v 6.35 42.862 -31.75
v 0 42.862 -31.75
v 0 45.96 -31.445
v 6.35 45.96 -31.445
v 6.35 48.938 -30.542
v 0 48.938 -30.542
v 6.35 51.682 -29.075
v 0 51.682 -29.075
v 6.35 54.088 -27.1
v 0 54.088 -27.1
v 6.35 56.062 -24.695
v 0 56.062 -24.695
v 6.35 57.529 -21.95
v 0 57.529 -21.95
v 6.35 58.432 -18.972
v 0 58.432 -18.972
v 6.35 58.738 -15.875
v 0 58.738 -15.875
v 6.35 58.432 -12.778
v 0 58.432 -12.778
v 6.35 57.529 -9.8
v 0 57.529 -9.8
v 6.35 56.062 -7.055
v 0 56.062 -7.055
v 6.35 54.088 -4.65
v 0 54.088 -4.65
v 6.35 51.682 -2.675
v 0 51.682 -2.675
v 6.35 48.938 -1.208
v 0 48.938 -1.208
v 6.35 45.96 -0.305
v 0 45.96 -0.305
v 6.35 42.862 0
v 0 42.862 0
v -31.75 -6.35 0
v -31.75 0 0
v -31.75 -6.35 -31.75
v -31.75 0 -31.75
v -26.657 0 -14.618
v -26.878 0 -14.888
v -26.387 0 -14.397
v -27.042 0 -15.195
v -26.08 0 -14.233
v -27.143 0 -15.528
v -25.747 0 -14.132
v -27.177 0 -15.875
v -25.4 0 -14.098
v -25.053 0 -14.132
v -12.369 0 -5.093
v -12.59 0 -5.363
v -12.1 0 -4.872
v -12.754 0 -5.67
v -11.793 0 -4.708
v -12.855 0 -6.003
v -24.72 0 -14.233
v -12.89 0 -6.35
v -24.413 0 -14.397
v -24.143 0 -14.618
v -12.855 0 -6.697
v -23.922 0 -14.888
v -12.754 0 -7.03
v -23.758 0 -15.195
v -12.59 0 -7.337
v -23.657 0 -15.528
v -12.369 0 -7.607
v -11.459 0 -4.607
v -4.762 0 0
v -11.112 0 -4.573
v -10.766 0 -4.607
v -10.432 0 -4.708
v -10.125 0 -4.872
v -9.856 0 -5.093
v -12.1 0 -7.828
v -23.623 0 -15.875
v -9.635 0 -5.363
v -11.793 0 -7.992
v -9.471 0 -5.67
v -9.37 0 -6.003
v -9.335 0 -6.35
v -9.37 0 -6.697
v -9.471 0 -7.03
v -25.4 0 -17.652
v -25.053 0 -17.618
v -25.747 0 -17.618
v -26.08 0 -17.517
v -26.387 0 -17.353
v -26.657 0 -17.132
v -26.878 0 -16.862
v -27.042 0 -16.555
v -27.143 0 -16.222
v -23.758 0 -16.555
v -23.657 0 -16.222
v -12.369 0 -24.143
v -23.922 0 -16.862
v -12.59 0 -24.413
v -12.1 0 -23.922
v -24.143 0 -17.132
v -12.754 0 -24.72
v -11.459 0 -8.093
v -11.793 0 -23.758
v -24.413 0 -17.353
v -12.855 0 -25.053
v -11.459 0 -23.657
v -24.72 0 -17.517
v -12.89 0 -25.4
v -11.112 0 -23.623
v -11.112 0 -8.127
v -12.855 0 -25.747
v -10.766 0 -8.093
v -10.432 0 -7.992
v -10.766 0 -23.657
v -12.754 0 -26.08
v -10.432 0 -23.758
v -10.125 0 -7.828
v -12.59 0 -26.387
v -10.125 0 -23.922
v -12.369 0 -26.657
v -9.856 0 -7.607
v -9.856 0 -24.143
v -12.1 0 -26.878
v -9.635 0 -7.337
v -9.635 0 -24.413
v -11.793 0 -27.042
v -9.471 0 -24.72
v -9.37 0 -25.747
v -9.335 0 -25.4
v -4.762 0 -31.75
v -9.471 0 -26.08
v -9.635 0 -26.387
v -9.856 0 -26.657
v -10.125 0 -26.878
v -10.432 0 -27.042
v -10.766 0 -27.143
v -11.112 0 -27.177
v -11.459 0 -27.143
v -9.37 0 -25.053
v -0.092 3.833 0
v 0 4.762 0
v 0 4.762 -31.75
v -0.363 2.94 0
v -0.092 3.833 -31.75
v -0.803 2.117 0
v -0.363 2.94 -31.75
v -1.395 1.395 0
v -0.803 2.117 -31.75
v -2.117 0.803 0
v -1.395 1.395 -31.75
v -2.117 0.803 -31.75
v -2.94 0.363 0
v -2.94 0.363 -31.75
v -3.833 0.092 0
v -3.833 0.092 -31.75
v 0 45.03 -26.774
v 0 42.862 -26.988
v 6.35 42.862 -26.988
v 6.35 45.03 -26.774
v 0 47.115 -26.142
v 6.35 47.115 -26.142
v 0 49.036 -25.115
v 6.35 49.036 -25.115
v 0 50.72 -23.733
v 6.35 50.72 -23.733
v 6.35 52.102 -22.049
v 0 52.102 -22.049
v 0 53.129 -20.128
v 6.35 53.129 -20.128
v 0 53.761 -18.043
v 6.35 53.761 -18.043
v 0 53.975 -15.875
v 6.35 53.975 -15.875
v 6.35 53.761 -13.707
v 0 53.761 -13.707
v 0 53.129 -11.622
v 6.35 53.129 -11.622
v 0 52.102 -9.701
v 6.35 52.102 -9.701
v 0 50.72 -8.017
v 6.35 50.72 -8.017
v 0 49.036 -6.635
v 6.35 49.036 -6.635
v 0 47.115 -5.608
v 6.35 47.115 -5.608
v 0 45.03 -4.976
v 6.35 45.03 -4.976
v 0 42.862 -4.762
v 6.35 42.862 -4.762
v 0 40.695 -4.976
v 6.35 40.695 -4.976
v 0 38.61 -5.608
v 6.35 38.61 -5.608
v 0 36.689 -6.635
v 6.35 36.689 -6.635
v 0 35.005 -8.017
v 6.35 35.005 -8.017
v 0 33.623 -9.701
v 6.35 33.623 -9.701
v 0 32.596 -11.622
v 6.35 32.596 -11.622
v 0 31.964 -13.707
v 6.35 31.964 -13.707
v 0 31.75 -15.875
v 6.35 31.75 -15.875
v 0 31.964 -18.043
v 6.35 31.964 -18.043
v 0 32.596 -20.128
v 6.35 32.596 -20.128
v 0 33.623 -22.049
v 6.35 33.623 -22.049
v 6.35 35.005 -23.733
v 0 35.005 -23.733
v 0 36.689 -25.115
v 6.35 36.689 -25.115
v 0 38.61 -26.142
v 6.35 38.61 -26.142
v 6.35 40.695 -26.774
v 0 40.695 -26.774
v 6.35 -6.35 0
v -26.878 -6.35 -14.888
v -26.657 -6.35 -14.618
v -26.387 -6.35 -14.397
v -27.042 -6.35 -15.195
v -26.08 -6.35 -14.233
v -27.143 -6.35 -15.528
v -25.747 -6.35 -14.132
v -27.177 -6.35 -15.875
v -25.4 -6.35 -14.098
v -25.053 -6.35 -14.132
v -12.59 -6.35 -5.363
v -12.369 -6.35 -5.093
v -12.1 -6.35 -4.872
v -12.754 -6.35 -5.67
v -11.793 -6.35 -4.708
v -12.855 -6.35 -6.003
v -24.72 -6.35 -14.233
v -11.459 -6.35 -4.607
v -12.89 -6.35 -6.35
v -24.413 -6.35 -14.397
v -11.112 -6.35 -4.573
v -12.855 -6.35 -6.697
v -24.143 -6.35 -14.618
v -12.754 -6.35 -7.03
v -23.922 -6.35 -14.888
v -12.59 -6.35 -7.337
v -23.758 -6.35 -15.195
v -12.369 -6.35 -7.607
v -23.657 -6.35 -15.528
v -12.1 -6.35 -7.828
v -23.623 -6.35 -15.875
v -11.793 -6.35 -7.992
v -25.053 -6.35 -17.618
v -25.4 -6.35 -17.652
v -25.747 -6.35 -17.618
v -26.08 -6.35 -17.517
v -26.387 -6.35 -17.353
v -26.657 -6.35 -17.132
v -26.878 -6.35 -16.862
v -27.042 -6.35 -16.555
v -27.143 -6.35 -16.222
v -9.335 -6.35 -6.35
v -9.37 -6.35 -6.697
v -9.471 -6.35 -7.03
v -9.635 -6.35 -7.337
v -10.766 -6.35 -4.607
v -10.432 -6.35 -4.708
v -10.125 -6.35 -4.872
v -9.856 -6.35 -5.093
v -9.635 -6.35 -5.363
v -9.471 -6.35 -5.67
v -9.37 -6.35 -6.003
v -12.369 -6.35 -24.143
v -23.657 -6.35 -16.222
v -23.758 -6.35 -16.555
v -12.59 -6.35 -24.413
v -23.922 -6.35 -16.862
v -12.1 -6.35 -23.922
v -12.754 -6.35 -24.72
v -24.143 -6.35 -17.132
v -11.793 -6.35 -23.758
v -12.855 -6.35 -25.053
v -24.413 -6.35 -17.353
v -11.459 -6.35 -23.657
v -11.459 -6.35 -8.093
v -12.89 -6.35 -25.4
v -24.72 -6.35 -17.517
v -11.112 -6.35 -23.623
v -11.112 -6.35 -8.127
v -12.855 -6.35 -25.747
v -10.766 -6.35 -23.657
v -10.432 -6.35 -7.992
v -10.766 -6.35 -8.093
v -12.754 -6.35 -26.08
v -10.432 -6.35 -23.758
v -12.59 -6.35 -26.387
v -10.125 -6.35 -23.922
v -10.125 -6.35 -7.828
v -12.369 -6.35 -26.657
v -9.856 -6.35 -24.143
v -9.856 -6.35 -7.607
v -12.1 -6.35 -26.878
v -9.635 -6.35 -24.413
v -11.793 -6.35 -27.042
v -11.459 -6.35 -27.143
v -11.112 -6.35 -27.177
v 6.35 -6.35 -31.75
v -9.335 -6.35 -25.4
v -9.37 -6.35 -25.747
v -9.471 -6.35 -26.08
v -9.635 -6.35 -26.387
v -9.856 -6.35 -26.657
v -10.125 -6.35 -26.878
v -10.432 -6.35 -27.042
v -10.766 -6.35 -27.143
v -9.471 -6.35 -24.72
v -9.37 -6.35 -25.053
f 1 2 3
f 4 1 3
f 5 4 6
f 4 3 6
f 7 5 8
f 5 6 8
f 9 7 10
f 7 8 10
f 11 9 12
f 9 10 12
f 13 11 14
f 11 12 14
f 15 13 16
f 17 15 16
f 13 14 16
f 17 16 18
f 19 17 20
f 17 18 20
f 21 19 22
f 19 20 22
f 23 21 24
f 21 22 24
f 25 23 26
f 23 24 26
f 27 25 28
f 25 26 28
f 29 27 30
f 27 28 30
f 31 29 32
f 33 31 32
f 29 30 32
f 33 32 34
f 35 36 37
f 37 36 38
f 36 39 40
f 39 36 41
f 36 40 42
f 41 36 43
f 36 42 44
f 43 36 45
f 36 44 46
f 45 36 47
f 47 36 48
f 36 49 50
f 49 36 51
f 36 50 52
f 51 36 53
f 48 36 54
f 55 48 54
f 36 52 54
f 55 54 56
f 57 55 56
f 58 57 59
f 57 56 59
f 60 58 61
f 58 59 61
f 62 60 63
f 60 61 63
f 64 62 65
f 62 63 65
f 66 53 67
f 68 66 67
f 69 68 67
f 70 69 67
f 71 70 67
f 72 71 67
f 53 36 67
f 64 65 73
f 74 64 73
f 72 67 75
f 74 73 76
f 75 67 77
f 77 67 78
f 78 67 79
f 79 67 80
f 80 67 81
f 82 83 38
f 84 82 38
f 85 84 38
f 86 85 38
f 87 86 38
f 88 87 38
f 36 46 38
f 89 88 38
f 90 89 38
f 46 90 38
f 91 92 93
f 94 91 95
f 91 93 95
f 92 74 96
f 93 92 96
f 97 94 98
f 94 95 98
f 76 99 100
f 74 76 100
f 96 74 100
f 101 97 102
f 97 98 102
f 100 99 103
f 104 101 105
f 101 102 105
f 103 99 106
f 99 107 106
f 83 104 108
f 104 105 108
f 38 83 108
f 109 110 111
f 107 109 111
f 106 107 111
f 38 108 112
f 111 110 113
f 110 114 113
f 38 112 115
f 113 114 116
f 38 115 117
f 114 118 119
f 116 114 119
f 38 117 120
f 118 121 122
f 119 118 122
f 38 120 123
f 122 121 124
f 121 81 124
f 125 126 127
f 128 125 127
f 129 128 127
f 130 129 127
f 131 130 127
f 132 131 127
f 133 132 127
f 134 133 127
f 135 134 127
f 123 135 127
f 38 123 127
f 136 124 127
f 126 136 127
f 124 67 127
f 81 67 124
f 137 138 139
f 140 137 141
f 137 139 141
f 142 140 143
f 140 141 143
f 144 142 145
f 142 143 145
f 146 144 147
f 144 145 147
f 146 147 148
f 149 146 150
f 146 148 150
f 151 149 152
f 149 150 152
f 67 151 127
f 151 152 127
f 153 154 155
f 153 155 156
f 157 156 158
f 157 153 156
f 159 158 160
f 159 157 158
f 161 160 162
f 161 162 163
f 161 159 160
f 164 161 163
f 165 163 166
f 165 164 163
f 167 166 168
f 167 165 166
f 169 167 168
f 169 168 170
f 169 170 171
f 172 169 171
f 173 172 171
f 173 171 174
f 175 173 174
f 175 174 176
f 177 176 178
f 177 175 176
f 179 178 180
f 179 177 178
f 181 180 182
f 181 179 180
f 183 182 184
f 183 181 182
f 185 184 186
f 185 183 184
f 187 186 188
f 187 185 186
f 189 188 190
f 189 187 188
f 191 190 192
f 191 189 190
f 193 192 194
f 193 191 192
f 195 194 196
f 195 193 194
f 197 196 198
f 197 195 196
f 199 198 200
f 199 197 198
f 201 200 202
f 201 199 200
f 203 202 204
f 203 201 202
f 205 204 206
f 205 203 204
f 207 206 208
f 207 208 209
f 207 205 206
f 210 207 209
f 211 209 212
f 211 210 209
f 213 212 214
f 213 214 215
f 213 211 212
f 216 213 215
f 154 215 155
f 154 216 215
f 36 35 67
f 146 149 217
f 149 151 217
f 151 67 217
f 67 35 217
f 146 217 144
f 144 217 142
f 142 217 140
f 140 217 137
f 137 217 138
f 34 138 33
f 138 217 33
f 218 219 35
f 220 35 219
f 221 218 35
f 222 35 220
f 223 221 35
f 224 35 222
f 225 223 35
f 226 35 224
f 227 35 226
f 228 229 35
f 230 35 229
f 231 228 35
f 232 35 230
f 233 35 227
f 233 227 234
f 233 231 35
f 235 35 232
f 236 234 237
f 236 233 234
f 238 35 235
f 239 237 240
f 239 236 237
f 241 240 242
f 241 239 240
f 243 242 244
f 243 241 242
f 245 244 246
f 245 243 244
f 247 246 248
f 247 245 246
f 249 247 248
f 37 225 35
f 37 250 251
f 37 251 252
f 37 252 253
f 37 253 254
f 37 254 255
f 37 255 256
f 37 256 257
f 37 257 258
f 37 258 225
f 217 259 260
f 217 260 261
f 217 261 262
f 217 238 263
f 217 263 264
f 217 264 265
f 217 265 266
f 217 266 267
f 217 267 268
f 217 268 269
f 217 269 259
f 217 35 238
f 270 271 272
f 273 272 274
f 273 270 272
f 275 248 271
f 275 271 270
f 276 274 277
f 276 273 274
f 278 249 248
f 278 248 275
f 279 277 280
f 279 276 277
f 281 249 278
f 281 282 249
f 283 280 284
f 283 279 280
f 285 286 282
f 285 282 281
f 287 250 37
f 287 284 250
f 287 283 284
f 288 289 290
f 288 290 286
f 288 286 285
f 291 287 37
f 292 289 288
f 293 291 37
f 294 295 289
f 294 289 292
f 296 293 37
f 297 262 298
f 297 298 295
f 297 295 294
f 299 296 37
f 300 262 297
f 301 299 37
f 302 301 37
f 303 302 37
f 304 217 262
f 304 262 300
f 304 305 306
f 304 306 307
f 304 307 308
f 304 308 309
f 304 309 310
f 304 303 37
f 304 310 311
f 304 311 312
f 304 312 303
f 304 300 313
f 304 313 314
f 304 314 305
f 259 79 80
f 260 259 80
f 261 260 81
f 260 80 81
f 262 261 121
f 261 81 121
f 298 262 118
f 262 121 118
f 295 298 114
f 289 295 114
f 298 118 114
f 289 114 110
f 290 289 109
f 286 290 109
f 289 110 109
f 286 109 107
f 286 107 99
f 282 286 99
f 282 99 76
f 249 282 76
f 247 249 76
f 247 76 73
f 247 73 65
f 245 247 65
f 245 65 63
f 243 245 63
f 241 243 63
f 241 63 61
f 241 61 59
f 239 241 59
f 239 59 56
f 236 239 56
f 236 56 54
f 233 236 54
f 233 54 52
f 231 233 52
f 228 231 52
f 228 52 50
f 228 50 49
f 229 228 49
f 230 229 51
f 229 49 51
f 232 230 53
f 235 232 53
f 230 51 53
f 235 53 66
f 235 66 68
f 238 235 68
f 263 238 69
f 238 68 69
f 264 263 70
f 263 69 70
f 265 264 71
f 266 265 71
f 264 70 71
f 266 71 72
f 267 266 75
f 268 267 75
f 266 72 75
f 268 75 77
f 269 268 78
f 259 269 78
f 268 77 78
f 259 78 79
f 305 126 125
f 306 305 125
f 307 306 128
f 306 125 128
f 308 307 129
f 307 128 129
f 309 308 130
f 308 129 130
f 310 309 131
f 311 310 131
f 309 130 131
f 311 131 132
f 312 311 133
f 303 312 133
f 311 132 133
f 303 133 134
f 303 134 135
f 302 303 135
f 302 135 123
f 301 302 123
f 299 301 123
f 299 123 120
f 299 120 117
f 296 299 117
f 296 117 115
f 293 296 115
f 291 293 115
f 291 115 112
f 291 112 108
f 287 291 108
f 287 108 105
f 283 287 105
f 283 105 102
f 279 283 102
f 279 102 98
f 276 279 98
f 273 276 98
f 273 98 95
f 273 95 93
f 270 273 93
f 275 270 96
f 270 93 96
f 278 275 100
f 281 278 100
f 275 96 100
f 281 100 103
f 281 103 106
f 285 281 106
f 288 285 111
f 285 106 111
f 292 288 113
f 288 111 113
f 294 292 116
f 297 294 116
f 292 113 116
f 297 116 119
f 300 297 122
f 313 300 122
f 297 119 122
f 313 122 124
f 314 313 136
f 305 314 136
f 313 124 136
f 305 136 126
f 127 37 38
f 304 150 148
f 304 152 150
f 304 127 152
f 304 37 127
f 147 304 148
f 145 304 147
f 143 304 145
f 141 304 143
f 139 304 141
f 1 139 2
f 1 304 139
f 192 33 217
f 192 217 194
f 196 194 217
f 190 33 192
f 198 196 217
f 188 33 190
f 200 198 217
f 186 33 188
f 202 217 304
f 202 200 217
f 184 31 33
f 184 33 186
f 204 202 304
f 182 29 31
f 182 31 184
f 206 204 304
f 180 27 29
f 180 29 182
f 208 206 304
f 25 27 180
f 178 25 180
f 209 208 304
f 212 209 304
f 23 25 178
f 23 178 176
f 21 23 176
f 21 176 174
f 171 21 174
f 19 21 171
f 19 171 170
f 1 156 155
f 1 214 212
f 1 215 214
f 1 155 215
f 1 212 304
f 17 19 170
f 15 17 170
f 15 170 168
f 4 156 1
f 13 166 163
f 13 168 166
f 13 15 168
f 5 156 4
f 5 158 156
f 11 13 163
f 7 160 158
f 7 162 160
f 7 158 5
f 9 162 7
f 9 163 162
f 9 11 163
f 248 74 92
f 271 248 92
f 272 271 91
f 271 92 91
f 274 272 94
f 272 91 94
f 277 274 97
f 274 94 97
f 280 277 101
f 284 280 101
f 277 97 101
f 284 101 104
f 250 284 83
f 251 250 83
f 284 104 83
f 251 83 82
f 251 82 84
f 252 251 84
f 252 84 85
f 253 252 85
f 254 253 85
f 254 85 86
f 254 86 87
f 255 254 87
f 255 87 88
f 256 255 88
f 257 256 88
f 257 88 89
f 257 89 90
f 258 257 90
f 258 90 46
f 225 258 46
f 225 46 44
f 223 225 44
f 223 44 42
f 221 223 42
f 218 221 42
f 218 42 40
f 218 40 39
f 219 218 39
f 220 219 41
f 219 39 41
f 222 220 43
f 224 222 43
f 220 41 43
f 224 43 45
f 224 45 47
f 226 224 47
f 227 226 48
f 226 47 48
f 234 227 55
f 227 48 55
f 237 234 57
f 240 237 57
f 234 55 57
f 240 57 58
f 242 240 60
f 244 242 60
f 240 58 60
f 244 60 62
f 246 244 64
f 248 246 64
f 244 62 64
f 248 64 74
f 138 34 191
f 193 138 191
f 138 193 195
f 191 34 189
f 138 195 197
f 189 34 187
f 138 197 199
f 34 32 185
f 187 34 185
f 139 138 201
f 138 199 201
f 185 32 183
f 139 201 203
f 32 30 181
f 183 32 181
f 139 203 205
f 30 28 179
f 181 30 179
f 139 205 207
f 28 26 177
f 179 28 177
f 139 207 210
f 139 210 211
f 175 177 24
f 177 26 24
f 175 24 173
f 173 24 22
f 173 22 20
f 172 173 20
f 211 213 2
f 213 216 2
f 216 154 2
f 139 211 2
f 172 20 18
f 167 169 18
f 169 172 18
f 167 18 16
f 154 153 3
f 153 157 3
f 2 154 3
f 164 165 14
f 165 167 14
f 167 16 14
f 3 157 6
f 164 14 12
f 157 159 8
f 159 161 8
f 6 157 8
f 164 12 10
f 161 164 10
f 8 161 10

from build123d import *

# Parameters (mm, degrees)
SKETCH3_R           = 11.1125
BOSS_EXTRUDE1_DEPTH = 6.35
SKETCH5_W           = 31.75
SKETCH5_H           = 6.35
BOSS_EXTRUDE2_DEPTH = 38.1
FILLET1_R           = 4.7625
SKETCH6_R           = 1.777000002
CUT_EXTRUDE1_DEPTH  = 7.35


with BuildPart() as part:
    # Sketch3 → Boss-Extrude1 (new body)
    with BuildSketch(Plane(origin=(0, 0, 0), x_dir=(0, 0, -1), z_dir=(1, 0, 0))):
        with BuildLine():
            Line((0, 0), (31.75, 0))
            Line((31.75, 0), (31.75, 42.8625))
            ThreePointArc((31.75, 42.8625), (15.875, 58.7375), (0, 42.8625))
            Line((0, 42.8625), (0, 0))
        make_face()
        with Locations((15.875, 42.8625)):
            Circle(SKETCH3_R, mode=Mode.SUBTRACT)
    extrude(amount=BOSS_EXTRUDE1_DEPTH)

    # Sketch5 → Boss-Extrude2 (add)
    with BuildSketch(Plane(origin=(6.35, 0, 0), x_dir=(0, 0, -1), z_dir=(1, 0, 0))):
        with Locations((15.875, -3.175)):
            Rectangle(SKETCH5_W, SKETCH5_H)
    extrude(amount=-BOSS_EXTRUDE2_DEPTH)

    # Fillet1
    fillet1_edges = [part.edges().sort_by_distance(p)[0] for p in [
        (0, 0, -15.875),
    ]]
    fillet(fillet1_edges, radius=FILLET1_R)

    # Sketch6 → Cut-Extrude1 (cut, through all)
    with BuildSketch(Plane(origin=(0, 0, 0), x_dir=(1, 0, 0), z_dir=(0, 1, 0))):
        with Locations((-11.1125, 6.35)):
            Circle(SKETCH6_R)
        with Locations((-25.4, 15.875)):
            Circle(SKETCH6_R)
        with Locations((-11.1125, 25.4)):
            Circle(SKETCH6_R)
    extrude(amount=-CUT_EXTRUDE1_DEPTH, mode=Mode.SUBTRACT)


solid = part.part
